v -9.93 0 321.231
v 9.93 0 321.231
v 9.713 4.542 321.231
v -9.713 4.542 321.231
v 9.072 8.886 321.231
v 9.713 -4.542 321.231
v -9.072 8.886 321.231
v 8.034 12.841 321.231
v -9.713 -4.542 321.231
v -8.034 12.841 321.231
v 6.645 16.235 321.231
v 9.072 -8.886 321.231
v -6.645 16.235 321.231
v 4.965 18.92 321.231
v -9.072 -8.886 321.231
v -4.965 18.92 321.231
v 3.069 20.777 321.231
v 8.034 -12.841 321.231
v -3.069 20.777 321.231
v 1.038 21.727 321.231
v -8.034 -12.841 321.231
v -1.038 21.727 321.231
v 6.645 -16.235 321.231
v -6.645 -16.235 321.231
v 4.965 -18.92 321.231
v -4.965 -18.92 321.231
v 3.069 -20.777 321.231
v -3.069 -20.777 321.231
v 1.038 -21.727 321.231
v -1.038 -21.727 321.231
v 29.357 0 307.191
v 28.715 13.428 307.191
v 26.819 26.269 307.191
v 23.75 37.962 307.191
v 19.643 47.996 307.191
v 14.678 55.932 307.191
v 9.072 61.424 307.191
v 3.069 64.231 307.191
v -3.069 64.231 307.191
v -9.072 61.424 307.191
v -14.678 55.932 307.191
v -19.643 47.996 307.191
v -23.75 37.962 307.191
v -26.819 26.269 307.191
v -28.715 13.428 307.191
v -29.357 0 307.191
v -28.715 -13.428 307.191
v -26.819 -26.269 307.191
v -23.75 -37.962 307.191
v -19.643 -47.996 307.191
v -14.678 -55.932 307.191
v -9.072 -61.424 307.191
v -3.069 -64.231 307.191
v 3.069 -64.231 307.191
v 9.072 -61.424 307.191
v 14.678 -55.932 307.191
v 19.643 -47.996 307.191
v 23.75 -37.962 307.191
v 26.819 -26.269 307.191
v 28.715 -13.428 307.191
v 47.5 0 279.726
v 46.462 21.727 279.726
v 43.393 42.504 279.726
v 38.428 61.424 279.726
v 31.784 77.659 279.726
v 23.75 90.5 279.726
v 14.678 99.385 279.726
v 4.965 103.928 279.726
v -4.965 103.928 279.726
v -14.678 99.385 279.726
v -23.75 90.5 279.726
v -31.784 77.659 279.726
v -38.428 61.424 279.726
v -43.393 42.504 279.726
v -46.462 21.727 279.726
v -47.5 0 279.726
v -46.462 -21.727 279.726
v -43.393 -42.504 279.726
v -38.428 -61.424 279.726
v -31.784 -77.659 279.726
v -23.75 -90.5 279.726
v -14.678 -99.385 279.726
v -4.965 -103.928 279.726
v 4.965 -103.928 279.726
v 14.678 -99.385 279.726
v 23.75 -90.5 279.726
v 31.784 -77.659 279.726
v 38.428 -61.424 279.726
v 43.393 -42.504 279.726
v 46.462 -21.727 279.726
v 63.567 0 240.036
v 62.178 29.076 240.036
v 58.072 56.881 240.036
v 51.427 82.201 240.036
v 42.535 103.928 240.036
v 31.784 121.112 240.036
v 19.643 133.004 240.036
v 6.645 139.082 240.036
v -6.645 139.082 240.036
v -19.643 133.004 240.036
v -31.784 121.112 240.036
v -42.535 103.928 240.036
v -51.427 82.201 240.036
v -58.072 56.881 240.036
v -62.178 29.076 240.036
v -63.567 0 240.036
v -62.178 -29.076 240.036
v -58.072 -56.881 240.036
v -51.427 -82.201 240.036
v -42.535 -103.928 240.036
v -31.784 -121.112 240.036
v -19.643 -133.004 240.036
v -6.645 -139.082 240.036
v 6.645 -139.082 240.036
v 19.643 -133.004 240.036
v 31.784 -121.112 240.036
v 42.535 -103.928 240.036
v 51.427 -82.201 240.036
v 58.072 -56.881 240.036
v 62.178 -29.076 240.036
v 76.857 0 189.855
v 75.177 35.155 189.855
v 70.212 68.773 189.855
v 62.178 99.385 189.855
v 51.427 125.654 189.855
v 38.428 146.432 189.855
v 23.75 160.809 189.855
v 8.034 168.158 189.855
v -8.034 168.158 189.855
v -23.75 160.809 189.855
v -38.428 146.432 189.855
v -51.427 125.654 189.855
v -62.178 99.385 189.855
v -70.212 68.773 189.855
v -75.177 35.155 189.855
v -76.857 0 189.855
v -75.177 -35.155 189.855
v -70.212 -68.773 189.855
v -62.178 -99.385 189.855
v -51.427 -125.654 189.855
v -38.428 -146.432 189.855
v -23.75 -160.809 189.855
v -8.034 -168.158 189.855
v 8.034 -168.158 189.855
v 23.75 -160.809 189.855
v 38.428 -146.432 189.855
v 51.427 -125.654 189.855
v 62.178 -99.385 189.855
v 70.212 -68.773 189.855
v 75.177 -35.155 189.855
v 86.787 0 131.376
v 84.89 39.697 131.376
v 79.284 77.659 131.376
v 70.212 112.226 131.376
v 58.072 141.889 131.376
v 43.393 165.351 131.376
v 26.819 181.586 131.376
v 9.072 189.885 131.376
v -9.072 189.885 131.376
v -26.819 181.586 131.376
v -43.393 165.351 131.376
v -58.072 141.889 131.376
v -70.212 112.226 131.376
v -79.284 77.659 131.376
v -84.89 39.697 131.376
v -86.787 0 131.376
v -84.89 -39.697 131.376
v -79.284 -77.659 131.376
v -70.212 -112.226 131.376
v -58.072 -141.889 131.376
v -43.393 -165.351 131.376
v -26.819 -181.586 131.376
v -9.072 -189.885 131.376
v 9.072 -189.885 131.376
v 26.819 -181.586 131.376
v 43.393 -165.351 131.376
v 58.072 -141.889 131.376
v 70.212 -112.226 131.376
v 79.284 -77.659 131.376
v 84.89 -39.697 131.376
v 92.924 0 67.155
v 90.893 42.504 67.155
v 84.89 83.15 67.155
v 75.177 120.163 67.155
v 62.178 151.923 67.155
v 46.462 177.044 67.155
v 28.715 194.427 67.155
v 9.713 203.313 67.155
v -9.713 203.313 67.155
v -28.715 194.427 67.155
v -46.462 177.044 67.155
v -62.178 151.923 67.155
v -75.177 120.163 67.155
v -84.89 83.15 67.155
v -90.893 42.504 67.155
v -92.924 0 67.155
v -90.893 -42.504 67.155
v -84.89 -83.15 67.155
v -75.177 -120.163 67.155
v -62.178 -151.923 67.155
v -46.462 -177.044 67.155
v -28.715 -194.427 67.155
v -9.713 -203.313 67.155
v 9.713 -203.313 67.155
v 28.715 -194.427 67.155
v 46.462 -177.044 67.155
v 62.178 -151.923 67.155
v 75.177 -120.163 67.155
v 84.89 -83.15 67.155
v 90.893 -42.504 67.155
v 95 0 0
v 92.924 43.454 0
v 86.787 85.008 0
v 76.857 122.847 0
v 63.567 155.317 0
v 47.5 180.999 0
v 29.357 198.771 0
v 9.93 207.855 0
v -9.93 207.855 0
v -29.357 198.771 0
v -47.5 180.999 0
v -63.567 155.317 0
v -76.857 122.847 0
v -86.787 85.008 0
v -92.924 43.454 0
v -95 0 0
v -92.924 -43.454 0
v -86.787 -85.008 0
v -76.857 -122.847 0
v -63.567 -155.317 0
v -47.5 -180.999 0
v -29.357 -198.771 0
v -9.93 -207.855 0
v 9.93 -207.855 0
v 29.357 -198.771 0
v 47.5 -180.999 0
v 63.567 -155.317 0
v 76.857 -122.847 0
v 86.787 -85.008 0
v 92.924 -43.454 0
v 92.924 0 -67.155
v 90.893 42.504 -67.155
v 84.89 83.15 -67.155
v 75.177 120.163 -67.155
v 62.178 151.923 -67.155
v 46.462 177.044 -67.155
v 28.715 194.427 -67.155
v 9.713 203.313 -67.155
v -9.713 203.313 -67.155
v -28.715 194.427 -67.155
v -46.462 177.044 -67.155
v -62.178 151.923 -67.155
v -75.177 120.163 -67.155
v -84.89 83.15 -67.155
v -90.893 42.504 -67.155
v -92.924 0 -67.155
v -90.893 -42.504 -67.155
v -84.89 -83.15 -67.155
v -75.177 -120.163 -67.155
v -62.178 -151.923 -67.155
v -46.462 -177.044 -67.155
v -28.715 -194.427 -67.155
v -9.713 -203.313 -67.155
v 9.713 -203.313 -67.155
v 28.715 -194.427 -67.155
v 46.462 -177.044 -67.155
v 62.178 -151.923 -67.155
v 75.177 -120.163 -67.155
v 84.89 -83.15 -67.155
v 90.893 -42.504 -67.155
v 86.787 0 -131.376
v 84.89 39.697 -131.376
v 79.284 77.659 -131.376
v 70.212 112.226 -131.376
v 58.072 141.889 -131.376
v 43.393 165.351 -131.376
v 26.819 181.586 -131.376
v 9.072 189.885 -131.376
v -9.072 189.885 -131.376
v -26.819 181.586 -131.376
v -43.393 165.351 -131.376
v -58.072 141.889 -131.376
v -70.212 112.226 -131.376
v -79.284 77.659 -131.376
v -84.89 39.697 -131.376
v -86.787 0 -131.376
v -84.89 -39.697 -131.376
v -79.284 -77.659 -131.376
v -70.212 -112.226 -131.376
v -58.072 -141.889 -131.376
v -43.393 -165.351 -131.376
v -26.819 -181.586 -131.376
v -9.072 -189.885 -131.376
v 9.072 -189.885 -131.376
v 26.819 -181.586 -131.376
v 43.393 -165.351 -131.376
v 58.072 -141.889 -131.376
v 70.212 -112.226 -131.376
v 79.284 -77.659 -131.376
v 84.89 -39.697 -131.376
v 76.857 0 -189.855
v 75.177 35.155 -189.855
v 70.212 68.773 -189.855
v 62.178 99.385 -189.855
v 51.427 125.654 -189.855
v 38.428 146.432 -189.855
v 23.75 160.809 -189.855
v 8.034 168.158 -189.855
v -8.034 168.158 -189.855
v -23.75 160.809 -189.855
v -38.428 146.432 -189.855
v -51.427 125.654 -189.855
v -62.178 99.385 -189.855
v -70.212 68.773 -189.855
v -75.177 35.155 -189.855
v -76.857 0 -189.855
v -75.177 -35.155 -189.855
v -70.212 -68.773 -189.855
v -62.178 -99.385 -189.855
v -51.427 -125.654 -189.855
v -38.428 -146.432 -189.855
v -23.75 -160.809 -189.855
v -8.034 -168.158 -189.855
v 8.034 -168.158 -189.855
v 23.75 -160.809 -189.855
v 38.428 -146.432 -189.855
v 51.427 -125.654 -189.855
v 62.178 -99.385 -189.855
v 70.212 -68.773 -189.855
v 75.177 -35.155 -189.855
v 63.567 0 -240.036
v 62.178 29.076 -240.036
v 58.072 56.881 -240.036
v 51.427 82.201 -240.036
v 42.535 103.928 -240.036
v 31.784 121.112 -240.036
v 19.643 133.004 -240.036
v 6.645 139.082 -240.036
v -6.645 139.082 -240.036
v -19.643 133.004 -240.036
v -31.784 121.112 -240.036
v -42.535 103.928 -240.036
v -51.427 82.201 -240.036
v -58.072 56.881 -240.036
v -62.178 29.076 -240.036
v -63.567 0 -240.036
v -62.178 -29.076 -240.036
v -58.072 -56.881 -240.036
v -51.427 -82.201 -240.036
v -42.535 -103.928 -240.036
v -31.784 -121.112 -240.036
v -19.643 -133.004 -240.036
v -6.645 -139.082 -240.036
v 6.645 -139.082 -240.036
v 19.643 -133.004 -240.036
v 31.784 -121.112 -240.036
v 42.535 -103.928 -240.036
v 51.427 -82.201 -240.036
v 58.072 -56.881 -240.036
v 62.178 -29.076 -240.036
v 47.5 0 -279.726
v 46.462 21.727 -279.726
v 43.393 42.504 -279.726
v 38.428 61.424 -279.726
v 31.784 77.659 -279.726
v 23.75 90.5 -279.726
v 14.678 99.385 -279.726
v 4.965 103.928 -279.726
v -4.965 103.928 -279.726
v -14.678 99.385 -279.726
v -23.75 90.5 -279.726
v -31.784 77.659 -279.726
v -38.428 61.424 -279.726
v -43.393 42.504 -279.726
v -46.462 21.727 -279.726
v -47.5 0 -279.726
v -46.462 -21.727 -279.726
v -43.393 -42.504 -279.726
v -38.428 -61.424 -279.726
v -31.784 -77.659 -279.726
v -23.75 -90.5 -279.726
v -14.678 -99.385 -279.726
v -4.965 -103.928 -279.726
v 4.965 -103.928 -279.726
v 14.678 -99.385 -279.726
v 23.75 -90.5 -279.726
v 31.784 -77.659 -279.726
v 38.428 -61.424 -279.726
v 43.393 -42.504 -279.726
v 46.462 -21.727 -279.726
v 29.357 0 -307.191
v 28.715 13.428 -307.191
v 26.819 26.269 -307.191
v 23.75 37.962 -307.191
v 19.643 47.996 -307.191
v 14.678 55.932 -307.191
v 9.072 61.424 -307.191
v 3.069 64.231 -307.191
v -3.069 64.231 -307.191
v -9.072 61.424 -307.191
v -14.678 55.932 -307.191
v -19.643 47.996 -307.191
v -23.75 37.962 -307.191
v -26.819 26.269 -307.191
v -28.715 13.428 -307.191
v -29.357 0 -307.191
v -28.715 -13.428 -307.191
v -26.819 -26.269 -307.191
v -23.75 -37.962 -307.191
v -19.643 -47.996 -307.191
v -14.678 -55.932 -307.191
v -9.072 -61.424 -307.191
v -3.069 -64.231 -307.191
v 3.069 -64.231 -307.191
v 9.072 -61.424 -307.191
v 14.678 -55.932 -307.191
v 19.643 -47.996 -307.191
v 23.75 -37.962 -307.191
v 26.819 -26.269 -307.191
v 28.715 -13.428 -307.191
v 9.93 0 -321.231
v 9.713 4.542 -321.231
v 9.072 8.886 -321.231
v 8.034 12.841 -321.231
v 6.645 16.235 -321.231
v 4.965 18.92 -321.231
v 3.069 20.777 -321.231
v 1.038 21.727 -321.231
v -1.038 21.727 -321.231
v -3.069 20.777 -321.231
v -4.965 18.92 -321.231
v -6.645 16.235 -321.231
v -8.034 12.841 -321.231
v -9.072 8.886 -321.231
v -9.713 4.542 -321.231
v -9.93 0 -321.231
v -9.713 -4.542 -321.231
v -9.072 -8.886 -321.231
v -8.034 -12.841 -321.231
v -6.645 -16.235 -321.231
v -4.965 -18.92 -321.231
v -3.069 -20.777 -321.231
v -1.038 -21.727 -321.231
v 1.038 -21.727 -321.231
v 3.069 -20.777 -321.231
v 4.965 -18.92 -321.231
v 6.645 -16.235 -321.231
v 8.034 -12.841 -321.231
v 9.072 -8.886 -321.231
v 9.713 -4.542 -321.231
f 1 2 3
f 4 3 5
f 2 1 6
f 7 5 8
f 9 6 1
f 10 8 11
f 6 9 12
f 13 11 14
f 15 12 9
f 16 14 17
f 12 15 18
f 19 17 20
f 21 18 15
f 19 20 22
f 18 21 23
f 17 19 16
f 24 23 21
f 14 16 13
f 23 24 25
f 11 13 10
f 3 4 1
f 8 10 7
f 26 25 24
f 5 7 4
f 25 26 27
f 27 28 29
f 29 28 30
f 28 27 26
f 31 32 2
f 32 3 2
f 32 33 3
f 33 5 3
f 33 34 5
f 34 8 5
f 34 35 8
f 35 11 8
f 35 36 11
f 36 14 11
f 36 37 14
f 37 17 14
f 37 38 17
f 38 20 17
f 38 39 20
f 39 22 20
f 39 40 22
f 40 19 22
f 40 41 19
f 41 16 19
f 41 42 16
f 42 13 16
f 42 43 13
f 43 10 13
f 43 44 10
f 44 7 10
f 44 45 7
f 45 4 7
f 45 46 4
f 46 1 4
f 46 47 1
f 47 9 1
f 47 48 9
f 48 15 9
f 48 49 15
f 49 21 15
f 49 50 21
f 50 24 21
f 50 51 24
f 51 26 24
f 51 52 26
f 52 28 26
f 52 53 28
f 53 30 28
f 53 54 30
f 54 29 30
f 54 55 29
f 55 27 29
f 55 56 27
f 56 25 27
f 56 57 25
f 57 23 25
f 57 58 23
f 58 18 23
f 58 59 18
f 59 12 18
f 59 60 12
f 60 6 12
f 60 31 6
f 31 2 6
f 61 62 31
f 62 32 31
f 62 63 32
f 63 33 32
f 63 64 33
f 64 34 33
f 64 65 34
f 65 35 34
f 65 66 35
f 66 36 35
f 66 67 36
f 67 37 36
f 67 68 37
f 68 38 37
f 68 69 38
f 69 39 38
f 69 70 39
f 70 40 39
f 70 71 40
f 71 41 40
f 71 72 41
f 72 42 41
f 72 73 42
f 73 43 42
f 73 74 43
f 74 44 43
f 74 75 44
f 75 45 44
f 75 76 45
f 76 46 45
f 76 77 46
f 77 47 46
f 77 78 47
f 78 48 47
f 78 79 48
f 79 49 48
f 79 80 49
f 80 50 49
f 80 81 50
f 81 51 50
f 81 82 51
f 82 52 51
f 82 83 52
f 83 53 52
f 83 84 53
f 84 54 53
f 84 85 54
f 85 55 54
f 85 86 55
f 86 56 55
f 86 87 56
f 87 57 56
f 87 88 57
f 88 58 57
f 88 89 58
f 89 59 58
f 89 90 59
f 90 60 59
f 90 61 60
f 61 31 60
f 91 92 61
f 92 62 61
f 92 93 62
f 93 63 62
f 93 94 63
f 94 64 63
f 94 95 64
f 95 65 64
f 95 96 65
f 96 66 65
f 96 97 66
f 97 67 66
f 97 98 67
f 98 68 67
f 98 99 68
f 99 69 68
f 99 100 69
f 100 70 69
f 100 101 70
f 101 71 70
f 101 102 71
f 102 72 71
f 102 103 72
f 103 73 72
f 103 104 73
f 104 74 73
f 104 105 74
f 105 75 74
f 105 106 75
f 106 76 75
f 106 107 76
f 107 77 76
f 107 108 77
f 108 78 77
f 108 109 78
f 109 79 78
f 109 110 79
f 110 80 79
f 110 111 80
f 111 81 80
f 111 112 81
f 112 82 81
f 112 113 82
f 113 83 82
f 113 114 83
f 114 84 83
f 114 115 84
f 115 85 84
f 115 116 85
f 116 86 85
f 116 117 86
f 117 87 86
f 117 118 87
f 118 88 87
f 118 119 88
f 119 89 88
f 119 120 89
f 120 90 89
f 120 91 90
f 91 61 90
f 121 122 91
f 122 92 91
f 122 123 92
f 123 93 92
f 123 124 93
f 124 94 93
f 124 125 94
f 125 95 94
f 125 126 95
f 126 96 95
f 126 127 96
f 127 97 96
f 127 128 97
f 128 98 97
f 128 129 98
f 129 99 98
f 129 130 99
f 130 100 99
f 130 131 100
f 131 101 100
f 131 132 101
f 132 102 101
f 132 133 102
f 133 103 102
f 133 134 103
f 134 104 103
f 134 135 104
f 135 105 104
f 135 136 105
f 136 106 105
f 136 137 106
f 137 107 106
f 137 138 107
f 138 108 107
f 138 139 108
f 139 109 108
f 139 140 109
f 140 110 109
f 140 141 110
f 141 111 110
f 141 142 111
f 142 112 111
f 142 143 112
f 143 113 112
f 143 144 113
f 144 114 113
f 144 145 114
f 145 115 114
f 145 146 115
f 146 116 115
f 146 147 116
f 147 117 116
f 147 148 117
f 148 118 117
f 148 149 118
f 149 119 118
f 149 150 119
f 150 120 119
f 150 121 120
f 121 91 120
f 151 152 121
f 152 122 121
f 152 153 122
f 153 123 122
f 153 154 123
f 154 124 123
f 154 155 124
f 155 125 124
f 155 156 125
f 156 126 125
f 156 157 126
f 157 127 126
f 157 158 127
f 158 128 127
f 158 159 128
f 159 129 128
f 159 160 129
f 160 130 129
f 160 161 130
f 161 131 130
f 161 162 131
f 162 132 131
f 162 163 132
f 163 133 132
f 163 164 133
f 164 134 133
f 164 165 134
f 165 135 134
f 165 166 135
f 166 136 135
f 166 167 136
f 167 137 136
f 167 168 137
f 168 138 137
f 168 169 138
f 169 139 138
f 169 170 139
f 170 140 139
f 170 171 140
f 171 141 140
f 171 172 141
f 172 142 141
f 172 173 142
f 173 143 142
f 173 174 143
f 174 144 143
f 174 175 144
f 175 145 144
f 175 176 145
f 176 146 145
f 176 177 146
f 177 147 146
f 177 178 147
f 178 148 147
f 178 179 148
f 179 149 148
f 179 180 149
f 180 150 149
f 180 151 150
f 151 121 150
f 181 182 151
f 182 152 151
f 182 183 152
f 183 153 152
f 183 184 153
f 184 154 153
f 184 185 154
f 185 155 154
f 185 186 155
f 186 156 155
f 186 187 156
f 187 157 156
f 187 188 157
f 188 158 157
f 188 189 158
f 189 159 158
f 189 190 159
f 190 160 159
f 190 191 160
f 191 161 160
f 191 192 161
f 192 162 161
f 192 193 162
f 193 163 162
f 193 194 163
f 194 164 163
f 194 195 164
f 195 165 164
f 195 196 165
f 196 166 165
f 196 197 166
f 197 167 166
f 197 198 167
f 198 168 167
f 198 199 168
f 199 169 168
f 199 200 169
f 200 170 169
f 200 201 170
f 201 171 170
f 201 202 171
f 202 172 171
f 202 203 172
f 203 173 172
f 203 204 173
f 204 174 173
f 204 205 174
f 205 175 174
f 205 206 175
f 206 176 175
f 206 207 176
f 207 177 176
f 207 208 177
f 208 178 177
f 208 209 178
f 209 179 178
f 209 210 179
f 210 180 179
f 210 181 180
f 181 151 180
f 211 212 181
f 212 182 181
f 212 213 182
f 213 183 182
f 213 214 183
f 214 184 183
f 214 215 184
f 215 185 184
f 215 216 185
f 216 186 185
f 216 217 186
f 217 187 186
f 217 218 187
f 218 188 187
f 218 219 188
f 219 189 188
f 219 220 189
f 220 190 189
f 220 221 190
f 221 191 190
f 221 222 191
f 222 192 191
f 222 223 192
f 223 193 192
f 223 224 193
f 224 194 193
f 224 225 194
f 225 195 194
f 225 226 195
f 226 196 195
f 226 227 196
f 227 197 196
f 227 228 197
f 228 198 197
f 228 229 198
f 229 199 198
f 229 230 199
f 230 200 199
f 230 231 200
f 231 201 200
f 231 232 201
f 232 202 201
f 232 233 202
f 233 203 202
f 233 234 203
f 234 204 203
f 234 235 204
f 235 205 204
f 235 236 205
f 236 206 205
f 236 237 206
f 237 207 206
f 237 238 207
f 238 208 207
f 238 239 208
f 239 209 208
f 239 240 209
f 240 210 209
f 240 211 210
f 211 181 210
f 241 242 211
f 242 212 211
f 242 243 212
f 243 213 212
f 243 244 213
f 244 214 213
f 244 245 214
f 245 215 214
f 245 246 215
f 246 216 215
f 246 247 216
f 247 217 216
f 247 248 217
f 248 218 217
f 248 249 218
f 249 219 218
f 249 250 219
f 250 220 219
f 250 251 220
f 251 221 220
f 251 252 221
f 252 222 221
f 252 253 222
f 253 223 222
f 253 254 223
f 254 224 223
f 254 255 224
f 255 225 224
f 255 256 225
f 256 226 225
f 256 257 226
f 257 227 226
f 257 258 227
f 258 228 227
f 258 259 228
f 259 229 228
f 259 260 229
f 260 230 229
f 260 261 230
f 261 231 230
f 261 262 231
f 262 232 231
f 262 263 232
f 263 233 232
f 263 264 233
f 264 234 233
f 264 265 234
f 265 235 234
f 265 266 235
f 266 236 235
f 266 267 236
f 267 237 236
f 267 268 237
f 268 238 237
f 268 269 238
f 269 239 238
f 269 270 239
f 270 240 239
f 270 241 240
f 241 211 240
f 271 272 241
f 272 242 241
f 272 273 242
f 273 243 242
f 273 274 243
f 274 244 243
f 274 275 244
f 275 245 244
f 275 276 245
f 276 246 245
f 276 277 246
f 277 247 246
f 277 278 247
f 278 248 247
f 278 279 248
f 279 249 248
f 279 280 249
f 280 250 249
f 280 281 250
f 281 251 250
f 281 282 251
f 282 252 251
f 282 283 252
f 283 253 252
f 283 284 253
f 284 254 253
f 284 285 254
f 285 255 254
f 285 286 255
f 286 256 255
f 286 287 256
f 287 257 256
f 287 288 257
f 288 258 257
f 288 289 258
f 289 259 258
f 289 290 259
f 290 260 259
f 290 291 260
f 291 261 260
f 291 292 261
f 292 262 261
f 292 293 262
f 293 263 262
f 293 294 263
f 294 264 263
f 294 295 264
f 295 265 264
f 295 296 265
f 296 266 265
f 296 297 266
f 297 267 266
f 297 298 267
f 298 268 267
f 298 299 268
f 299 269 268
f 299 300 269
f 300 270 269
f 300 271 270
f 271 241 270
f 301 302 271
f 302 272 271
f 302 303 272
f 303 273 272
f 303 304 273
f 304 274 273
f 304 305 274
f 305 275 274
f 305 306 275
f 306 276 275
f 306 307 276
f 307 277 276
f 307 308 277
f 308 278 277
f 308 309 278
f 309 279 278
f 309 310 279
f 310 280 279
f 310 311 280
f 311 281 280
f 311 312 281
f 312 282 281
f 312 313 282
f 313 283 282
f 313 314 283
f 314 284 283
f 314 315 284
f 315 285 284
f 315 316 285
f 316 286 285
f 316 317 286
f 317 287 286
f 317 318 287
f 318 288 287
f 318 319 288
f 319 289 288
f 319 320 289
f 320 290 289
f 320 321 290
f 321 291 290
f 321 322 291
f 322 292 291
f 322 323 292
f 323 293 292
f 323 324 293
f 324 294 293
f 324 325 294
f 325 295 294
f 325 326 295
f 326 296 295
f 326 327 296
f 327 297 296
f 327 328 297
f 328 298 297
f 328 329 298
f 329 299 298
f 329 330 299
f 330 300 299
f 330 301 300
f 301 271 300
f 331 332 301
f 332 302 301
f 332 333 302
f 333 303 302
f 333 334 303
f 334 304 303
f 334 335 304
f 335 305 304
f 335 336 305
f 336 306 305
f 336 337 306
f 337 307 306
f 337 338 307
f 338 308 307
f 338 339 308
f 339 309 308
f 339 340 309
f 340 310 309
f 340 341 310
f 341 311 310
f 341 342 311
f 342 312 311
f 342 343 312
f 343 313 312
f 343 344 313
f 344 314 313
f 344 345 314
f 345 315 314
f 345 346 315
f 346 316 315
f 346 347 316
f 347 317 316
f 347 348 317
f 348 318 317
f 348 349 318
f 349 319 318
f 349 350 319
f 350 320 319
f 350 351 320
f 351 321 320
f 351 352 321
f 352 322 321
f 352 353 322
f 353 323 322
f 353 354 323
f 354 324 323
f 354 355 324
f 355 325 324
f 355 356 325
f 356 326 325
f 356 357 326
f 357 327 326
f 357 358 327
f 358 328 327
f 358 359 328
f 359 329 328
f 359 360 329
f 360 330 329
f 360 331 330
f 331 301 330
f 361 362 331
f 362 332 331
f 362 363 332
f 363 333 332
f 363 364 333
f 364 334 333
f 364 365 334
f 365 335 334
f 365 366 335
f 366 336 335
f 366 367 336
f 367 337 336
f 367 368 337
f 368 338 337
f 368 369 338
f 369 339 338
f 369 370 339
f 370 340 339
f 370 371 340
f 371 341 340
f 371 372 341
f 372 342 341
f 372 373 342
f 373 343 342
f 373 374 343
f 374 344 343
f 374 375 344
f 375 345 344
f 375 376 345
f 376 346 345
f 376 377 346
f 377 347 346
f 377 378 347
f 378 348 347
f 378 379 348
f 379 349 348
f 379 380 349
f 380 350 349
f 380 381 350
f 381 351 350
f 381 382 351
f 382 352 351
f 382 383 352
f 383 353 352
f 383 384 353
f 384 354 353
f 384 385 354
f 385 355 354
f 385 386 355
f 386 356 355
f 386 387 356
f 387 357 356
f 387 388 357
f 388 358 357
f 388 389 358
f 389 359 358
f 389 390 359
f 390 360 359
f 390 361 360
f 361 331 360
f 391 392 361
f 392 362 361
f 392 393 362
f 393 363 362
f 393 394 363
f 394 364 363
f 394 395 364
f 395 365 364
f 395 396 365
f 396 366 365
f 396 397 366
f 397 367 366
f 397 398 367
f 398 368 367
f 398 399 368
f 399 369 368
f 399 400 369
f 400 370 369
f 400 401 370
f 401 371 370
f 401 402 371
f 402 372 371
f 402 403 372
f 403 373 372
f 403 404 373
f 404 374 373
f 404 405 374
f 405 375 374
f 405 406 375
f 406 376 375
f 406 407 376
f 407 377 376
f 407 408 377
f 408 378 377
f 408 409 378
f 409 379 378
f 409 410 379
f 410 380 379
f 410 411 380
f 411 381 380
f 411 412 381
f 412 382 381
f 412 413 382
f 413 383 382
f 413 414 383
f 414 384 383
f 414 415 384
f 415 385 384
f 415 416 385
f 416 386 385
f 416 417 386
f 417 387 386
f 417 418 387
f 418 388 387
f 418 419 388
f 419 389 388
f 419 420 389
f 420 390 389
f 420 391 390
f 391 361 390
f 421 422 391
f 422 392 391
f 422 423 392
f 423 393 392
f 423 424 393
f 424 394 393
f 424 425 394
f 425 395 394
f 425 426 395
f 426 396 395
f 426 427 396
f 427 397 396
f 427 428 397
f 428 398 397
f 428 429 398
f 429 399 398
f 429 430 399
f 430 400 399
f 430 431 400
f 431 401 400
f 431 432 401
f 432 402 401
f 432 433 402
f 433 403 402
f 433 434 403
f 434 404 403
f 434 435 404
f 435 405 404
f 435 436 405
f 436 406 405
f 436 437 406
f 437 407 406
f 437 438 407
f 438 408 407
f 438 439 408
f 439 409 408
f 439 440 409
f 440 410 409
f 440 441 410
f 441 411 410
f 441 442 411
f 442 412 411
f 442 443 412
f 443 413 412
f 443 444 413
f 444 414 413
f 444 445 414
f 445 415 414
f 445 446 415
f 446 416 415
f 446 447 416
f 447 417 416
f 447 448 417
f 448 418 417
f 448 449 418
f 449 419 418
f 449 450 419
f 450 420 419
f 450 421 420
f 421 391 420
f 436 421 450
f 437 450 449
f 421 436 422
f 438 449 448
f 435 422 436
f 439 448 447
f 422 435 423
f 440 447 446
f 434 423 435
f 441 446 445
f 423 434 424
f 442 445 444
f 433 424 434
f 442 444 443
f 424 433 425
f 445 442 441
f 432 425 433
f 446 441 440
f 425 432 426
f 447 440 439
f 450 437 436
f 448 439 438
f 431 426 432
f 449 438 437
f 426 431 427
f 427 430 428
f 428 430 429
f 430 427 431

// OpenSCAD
// Generated by SolidPython 1.0.1 on 2020-07-29 00:39:26


scale(v = [5, 11, 17]) {
	sphere(r = 19);
}
/***********************************************
*********      SolidPython code:      **********
************************************************
 
# import packages: SolidPython
from solid import *
from solid.utils import *
from itertools import chain, combinations


class Resize:

    def __init__(self, scad_file):
        self.scad_file = scad_file
        #self.scad_file = import_scad(scad_file)
        # cone/cylinder param:
        self.r1 = 0
        self.r2 = 0
        self.h = 0
        # rectangular prism param:
        self.w = 0
        self.l = 0
        # ellipse param:
        self.r = 0

    # import OpenScad code (file name corresponds to shape)


    # classify shape + parameters
    def assign(self, param1, param2, param3):
        if self.scad_file == 'cone.scad':
            self.r1 = param1
            self.r2 = param2
            self.h = param3
        elif self.scad_file == 'cylinder.scad':
            self.r1 = param1
            self.r2 = param2
            self.h = param3
        elif self.scad_file == 'rectangularPrism.scad':
            self.h = param1
            self.l = param2
            self.w = param3
        else:
            self.r = param1
            self.h = param2

    # resize parameters
    def iterate(self):
        x = range(3, 20, 2)
        i = 1
        if self.scad_file == 'cone.scad':
            tempList = list(combinations(x, 2))
            for temp in tempList:
                param1 = temp[0]
                param2 = temp[1]
                filepath = 'produced_scad_files/' + 'cone' + str(param1) + '_' + str(param2) + '_' + '.scad'
                scad_render_to_file(cylinder(h=param1, r1=param2, r2=0), filepath)

        elif self.scad_file == 'cylinder.scad':
            tempList = list(combinations(x, 3))
            for temp in tempList:
                param1 = temp[0]
                param2 = temp[1]
                filepath = 'produced_scad_files/' + 'cylinder' + str(param1) + '_' + str(param2) + '_' + '.scad'
                scad_render_to_file(cylinder(h=param1, r1=param2, r2=param2), filepath)

        elif self.scad_file == 'rectangularPrism.scad':
            tempList = list(combinations(x, 3))
            for temp in tempList:
                param1 = temp[0]
                param2 = temp[1]
                param3 = temp[2]
                filepath = 'produced_scad_files/' + 'rectangularPrism' + str(param1) + '_' + str(param2) + '_' + str(
                    param3) + '.scad'
                scad_render_to_file(cube(size=(param1, param2, param3)), filepath)

        elif self.scad_file == 'ellipse.scad':
            tempList = list(combinations(x, 4))
            for temp in tempList:
                param1 = temp[0]
                param2 = temp[1]
                param3 = temp[2]
                param4 = temp[3]
                filepath = 'produced_scad_files/' + 'ellipse' + str(param1) + '_' + str(param2) + '_' + str(param3) + '_' + str(param4) + '.scad'
                scad_render_to_file(scale([param1, param2, param3])(sphere(r=param4)), filepath)

    def render_to_scadfile(self):
        scad_render_to_file(scad, 'example.scad') 
 
************************************************/
